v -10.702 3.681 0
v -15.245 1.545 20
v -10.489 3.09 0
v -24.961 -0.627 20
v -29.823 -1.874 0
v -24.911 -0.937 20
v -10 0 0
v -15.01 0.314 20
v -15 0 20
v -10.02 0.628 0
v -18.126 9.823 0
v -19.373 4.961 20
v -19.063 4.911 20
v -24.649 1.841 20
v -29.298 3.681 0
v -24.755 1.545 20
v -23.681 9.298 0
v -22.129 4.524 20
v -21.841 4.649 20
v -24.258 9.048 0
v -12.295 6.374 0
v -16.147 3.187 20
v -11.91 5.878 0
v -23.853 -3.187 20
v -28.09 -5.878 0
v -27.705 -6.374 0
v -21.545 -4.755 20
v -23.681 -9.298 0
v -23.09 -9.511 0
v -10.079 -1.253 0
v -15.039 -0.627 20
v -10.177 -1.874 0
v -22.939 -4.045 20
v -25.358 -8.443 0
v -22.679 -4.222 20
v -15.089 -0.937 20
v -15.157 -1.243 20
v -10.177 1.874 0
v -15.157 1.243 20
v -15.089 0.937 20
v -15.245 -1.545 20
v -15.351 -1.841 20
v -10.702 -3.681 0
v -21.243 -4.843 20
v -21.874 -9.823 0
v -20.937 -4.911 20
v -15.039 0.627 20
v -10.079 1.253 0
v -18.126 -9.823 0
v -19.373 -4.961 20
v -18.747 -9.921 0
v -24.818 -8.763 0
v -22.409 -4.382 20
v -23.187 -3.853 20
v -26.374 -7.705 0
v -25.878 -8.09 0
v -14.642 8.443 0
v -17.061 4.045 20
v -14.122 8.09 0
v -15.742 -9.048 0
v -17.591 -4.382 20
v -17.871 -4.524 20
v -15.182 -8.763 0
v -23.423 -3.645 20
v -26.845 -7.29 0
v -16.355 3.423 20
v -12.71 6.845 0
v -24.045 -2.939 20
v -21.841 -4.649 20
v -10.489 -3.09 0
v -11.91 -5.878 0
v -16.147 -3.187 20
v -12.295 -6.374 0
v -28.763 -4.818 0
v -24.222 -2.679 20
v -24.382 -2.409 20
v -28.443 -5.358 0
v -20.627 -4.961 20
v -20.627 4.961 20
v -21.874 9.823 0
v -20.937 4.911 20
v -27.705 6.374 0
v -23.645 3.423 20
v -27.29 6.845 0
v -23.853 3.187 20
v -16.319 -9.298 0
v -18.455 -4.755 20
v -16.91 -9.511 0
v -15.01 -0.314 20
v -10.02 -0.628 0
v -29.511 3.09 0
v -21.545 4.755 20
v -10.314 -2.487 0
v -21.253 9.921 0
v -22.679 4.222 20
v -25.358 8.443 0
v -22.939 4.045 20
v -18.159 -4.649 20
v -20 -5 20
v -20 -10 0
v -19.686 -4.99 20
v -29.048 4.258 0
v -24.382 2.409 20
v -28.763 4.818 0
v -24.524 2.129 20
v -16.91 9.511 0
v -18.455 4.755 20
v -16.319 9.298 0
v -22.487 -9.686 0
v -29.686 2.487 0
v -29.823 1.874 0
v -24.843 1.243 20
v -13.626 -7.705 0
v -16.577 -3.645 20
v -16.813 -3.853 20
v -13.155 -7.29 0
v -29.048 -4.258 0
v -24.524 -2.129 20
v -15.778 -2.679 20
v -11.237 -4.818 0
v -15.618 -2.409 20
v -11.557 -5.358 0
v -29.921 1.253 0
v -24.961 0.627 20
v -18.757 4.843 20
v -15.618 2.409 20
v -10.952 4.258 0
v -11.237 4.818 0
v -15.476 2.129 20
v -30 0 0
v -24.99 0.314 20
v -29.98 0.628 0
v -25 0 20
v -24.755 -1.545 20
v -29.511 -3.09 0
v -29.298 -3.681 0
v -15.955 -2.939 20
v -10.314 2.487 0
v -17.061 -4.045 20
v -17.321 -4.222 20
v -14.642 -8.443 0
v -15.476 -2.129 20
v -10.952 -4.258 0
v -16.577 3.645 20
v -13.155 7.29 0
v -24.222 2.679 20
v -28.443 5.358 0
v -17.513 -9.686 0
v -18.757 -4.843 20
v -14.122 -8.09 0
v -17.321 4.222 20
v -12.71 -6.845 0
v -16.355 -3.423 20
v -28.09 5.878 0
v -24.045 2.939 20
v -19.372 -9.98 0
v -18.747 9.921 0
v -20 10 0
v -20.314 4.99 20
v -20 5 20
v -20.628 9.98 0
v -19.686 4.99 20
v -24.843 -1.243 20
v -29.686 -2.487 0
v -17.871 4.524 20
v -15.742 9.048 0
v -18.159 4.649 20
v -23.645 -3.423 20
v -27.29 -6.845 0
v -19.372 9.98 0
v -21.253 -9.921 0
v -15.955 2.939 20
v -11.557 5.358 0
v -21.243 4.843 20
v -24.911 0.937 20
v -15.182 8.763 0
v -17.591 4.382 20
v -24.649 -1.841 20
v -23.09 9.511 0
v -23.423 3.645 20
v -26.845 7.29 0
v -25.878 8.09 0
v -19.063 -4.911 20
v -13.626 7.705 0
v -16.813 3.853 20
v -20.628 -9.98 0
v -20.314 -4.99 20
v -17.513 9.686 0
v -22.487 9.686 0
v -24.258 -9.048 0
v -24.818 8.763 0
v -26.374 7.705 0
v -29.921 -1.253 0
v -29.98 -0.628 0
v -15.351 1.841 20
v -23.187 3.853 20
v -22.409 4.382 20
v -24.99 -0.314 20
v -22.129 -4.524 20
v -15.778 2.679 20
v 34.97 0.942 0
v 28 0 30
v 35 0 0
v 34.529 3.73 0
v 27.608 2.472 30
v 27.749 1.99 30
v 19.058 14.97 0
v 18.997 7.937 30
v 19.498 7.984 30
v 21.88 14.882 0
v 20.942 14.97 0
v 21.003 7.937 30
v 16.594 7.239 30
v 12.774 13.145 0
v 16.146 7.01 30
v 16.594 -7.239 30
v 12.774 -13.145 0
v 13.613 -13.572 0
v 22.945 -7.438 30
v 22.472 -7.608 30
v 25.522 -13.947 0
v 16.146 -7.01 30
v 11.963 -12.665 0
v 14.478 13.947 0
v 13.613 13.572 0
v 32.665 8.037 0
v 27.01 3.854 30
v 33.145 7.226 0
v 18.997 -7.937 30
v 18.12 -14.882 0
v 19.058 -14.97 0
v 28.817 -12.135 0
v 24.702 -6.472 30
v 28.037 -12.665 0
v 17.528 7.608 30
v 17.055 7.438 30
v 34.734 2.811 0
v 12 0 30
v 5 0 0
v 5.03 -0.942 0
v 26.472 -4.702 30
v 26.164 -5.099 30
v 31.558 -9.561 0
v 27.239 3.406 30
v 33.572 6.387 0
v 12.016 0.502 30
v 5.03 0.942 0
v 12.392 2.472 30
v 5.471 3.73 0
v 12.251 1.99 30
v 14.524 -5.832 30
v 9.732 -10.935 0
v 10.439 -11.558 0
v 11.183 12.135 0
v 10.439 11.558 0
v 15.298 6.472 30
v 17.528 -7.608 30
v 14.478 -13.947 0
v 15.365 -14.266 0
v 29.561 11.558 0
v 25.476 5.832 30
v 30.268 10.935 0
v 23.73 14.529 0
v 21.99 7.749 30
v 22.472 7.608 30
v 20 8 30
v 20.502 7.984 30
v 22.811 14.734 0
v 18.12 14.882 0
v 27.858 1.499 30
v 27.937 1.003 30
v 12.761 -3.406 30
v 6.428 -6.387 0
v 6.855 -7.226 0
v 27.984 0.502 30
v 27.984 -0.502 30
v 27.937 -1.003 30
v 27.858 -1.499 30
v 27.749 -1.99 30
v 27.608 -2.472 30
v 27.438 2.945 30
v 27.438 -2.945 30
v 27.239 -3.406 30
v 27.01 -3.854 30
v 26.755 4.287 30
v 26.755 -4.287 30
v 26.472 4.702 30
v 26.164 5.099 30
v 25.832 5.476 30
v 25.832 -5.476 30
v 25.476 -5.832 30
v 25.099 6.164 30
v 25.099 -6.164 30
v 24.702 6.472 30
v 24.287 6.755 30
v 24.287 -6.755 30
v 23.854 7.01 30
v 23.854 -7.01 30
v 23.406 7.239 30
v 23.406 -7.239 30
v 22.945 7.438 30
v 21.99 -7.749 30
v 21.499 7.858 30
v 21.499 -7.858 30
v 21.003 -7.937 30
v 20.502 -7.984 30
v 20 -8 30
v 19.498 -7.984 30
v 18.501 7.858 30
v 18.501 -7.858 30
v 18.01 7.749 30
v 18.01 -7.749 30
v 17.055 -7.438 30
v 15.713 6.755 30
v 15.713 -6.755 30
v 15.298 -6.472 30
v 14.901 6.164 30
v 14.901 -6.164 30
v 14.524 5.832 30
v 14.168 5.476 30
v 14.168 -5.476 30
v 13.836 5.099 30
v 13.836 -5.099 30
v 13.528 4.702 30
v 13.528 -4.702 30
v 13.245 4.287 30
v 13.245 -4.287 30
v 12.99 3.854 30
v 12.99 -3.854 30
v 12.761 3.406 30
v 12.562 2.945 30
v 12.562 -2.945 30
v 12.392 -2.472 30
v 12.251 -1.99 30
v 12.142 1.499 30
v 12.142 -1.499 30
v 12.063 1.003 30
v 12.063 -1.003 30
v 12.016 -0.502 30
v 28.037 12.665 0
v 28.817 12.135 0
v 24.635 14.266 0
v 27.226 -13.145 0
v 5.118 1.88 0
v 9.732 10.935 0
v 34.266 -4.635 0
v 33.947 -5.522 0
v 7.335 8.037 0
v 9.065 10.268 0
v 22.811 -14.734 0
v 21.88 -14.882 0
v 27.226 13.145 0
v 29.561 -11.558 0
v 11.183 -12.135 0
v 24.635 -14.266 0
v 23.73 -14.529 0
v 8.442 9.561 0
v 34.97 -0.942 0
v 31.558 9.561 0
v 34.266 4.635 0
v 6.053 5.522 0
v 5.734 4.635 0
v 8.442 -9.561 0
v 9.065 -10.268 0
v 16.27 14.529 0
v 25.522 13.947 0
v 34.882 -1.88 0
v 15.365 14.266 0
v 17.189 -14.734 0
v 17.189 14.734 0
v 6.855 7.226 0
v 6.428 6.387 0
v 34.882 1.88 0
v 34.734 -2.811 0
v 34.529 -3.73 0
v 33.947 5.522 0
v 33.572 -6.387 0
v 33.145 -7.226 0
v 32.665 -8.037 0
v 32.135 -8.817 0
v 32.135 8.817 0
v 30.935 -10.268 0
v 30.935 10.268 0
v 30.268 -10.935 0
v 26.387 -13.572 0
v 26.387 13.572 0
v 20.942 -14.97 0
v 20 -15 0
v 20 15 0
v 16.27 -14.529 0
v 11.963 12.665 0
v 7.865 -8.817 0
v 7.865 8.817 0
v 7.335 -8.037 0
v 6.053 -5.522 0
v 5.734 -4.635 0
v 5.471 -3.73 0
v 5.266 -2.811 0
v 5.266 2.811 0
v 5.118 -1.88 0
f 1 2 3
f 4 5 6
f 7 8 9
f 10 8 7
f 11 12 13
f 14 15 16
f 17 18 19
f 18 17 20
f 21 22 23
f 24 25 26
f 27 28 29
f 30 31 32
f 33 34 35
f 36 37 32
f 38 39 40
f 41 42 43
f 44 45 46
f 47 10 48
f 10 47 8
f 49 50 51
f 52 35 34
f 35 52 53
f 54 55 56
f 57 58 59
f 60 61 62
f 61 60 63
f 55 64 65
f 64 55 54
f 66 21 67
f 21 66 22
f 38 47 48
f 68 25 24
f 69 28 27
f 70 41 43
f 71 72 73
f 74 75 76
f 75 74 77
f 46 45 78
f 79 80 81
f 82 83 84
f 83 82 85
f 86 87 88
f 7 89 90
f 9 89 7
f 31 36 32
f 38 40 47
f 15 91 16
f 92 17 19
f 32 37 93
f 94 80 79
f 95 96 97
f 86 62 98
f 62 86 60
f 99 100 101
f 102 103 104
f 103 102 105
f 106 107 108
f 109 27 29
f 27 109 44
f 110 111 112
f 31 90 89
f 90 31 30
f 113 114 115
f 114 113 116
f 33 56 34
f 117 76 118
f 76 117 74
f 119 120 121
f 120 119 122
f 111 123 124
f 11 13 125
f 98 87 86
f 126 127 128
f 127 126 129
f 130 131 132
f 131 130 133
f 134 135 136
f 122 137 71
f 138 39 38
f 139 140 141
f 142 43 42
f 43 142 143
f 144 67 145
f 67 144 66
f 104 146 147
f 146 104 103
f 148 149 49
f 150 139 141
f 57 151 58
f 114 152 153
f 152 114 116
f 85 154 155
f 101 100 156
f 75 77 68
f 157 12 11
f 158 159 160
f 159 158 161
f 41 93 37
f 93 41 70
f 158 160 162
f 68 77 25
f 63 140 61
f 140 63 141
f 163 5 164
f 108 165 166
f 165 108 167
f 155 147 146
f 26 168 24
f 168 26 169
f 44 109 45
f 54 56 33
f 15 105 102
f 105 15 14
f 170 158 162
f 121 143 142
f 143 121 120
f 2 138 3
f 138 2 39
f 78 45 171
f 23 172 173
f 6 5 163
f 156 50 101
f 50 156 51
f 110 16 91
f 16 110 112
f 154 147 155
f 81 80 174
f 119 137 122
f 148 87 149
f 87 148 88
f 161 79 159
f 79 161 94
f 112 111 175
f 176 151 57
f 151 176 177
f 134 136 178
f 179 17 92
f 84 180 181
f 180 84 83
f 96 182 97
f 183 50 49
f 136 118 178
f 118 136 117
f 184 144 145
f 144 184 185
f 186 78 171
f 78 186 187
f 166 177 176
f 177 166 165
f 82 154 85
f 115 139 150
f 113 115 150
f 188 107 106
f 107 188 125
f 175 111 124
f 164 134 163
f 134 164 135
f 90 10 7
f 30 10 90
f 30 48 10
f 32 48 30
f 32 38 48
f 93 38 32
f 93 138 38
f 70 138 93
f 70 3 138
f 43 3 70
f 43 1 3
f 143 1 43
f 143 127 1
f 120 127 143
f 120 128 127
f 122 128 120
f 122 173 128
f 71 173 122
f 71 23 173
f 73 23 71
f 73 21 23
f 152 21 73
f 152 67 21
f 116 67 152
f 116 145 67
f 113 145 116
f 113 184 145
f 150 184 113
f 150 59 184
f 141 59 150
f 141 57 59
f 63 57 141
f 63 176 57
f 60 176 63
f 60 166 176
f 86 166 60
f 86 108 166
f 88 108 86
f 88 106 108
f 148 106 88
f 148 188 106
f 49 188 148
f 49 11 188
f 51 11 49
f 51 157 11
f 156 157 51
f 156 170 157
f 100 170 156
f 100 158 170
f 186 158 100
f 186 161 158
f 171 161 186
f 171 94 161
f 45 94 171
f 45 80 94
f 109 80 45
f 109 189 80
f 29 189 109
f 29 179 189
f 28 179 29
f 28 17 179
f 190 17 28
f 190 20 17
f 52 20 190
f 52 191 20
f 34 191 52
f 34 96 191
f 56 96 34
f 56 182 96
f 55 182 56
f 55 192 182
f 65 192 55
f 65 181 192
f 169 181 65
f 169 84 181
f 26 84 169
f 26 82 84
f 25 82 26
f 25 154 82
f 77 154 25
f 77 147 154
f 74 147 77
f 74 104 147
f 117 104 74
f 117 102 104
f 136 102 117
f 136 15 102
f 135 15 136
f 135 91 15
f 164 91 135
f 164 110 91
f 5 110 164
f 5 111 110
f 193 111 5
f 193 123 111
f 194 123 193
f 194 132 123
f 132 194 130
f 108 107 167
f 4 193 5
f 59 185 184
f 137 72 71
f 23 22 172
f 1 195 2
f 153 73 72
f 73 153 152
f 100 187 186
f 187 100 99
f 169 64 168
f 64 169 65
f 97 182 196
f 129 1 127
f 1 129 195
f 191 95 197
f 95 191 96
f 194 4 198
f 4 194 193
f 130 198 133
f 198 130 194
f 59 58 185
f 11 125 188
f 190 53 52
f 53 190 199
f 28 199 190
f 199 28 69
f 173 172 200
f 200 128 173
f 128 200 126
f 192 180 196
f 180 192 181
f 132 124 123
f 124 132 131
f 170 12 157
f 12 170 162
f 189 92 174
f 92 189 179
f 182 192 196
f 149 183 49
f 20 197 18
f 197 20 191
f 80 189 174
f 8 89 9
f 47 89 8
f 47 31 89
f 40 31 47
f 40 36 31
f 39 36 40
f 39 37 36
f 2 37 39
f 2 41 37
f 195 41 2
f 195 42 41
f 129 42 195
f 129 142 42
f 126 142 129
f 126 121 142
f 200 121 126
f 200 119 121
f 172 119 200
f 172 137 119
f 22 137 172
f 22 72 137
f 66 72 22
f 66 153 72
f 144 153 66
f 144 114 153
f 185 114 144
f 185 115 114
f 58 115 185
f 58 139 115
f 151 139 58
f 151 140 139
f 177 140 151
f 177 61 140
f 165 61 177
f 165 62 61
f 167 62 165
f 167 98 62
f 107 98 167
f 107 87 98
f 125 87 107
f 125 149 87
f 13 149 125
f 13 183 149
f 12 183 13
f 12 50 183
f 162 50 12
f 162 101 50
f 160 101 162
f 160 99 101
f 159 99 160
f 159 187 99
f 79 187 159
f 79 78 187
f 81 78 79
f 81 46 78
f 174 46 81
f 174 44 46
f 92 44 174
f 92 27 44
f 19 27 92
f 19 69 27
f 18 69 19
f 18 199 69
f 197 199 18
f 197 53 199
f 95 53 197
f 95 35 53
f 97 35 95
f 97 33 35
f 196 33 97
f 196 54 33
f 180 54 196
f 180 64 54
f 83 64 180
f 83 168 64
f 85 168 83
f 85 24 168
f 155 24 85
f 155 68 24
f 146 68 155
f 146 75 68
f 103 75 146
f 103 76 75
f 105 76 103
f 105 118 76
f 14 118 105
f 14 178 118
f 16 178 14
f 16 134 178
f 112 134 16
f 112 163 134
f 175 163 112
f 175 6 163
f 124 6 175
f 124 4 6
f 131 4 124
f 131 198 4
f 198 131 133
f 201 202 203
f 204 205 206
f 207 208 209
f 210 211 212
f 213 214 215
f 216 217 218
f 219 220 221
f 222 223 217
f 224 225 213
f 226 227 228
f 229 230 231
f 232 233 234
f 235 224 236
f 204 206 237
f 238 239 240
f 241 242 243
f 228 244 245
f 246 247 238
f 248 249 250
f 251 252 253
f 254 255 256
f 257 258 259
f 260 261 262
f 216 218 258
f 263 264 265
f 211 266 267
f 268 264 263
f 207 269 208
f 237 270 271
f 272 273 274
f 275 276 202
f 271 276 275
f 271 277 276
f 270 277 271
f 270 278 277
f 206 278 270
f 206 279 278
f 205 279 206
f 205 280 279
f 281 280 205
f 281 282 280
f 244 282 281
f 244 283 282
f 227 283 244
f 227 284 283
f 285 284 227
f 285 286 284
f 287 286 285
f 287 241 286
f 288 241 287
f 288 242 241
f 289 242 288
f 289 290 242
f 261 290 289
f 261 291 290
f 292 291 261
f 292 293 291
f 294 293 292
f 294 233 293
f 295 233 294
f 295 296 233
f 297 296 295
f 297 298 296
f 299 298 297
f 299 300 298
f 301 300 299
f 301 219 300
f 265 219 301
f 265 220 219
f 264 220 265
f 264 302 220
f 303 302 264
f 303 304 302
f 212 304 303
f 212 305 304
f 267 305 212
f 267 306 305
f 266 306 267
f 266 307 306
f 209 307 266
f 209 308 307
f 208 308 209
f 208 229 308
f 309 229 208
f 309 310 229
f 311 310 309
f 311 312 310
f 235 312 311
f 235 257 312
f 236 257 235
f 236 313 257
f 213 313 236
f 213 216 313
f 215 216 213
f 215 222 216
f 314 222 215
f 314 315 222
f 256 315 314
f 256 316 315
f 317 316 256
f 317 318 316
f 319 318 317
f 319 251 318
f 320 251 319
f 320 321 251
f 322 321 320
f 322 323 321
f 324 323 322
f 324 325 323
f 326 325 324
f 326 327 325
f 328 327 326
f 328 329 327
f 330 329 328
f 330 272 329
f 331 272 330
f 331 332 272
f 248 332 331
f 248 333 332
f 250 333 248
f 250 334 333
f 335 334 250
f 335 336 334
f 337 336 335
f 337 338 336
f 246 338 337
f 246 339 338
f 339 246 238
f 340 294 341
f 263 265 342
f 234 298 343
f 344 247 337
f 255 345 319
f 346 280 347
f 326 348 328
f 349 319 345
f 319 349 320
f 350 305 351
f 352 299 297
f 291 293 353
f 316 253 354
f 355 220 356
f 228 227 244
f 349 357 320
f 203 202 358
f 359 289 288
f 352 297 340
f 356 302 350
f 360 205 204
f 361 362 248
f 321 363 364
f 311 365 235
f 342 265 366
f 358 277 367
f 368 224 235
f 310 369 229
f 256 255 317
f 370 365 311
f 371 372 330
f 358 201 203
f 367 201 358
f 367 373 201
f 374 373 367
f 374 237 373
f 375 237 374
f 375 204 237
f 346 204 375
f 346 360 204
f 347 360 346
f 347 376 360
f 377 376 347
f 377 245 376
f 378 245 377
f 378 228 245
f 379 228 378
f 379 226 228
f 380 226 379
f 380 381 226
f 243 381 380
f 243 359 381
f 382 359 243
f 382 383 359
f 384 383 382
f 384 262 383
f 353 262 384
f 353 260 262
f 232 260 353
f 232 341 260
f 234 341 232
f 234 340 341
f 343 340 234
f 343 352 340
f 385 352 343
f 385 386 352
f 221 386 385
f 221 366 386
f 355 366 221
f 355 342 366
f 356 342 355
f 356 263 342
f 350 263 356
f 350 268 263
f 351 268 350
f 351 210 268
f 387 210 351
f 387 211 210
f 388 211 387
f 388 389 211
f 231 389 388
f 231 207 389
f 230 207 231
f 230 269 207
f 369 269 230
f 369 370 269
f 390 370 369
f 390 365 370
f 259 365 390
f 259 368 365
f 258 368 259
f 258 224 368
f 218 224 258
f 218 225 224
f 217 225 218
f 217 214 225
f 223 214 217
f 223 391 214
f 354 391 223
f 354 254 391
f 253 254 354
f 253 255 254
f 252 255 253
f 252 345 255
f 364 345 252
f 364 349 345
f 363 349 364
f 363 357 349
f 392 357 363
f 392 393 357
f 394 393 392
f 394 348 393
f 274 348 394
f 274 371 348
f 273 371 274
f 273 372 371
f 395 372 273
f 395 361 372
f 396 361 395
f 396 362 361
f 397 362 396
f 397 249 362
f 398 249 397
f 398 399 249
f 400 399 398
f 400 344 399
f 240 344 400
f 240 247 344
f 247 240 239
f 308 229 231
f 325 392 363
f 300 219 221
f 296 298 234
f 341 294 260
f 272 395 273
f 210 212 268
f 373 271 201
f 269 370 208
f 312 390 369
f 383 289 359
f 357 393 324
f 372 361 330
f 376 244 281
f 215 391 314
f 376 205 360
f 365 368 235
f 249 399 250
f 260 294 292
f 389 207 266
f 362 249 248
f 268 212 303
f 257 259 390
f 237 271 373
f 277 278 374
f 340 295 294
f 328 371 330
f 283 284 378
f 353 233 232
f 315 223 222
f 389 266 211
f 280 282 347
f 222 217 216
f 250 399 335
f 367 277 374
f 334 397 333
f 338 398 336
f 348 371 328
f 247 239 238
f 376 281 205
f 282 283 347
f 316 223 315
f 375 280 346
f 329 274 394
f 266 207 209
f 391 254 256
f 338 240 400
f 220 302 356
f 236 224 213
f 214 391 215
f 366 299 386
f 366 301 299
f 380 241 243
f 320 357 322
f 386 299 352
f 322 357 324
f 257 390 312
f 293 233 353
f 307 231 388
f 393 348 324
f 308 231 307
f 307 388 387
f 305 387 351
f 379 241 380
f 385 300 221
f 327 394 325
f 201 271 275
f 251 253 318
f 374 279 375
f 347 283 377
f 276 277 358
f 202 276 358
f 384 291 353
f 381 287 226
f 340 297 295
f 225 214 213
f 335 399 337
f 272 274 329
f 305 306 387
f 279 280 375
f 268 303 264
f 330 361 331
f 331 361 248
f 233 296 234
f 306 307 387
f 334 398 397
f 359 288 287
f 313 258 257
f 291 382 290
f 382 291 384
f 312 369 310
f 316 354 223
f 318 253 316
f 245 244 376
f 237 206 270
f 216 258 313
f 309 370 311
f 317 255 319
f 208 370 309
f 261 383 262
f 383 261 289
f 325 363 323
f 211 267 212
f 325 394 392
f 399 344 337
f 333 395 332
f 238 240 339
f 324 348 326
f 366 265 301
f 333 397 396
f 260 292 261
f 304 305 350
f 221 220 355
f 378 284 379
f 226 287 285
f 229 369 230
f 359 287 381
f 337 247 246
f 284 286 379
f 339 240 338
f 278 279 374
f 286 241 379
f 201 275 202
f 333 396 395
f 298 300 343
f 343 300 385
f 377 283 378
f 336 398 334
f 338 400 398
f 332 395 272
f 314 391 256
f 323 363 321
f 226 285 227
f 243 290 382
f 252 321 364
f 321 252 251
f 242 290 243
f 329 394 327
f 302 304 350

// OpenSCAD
// file: ../../lib/shapes/truncated_cone.scad
// lib/shapes/truncated_cone.scad

/**
 * Creates a truncated cone with the specified base and top radii and height.
 *
 * @param base_radius The radius of the base of the cone.
 * @param top_radius The radius of the top of the cone.
 * @param height The height of the cone.
 * @param $fn The number of fragments (resolution) to render the cone.
 */
module shapeTruncatedCone(base_radius = 10, top_radius = 5, height = 20, $fn = 100) {
    cylinder(r1 = base_radius, r2 = top_radius, h = height, $fn = $fn);
}
// main file
// tests/shapes/test_truncated_cone.scad

use <../../lib/shapes/truncated_cone.scad>

module testTruncatedCone() {
    translate([-20, 0, 0])
    shapeTruncatedCone(base_radius = 10, top_radius = 5, height = 20);

    translate([20, 0, 0])
    shapeTruncatedCone(base_radius = 15, top_radius = 8, height = 30);
}

// Run tests
testTruncatedCone();
